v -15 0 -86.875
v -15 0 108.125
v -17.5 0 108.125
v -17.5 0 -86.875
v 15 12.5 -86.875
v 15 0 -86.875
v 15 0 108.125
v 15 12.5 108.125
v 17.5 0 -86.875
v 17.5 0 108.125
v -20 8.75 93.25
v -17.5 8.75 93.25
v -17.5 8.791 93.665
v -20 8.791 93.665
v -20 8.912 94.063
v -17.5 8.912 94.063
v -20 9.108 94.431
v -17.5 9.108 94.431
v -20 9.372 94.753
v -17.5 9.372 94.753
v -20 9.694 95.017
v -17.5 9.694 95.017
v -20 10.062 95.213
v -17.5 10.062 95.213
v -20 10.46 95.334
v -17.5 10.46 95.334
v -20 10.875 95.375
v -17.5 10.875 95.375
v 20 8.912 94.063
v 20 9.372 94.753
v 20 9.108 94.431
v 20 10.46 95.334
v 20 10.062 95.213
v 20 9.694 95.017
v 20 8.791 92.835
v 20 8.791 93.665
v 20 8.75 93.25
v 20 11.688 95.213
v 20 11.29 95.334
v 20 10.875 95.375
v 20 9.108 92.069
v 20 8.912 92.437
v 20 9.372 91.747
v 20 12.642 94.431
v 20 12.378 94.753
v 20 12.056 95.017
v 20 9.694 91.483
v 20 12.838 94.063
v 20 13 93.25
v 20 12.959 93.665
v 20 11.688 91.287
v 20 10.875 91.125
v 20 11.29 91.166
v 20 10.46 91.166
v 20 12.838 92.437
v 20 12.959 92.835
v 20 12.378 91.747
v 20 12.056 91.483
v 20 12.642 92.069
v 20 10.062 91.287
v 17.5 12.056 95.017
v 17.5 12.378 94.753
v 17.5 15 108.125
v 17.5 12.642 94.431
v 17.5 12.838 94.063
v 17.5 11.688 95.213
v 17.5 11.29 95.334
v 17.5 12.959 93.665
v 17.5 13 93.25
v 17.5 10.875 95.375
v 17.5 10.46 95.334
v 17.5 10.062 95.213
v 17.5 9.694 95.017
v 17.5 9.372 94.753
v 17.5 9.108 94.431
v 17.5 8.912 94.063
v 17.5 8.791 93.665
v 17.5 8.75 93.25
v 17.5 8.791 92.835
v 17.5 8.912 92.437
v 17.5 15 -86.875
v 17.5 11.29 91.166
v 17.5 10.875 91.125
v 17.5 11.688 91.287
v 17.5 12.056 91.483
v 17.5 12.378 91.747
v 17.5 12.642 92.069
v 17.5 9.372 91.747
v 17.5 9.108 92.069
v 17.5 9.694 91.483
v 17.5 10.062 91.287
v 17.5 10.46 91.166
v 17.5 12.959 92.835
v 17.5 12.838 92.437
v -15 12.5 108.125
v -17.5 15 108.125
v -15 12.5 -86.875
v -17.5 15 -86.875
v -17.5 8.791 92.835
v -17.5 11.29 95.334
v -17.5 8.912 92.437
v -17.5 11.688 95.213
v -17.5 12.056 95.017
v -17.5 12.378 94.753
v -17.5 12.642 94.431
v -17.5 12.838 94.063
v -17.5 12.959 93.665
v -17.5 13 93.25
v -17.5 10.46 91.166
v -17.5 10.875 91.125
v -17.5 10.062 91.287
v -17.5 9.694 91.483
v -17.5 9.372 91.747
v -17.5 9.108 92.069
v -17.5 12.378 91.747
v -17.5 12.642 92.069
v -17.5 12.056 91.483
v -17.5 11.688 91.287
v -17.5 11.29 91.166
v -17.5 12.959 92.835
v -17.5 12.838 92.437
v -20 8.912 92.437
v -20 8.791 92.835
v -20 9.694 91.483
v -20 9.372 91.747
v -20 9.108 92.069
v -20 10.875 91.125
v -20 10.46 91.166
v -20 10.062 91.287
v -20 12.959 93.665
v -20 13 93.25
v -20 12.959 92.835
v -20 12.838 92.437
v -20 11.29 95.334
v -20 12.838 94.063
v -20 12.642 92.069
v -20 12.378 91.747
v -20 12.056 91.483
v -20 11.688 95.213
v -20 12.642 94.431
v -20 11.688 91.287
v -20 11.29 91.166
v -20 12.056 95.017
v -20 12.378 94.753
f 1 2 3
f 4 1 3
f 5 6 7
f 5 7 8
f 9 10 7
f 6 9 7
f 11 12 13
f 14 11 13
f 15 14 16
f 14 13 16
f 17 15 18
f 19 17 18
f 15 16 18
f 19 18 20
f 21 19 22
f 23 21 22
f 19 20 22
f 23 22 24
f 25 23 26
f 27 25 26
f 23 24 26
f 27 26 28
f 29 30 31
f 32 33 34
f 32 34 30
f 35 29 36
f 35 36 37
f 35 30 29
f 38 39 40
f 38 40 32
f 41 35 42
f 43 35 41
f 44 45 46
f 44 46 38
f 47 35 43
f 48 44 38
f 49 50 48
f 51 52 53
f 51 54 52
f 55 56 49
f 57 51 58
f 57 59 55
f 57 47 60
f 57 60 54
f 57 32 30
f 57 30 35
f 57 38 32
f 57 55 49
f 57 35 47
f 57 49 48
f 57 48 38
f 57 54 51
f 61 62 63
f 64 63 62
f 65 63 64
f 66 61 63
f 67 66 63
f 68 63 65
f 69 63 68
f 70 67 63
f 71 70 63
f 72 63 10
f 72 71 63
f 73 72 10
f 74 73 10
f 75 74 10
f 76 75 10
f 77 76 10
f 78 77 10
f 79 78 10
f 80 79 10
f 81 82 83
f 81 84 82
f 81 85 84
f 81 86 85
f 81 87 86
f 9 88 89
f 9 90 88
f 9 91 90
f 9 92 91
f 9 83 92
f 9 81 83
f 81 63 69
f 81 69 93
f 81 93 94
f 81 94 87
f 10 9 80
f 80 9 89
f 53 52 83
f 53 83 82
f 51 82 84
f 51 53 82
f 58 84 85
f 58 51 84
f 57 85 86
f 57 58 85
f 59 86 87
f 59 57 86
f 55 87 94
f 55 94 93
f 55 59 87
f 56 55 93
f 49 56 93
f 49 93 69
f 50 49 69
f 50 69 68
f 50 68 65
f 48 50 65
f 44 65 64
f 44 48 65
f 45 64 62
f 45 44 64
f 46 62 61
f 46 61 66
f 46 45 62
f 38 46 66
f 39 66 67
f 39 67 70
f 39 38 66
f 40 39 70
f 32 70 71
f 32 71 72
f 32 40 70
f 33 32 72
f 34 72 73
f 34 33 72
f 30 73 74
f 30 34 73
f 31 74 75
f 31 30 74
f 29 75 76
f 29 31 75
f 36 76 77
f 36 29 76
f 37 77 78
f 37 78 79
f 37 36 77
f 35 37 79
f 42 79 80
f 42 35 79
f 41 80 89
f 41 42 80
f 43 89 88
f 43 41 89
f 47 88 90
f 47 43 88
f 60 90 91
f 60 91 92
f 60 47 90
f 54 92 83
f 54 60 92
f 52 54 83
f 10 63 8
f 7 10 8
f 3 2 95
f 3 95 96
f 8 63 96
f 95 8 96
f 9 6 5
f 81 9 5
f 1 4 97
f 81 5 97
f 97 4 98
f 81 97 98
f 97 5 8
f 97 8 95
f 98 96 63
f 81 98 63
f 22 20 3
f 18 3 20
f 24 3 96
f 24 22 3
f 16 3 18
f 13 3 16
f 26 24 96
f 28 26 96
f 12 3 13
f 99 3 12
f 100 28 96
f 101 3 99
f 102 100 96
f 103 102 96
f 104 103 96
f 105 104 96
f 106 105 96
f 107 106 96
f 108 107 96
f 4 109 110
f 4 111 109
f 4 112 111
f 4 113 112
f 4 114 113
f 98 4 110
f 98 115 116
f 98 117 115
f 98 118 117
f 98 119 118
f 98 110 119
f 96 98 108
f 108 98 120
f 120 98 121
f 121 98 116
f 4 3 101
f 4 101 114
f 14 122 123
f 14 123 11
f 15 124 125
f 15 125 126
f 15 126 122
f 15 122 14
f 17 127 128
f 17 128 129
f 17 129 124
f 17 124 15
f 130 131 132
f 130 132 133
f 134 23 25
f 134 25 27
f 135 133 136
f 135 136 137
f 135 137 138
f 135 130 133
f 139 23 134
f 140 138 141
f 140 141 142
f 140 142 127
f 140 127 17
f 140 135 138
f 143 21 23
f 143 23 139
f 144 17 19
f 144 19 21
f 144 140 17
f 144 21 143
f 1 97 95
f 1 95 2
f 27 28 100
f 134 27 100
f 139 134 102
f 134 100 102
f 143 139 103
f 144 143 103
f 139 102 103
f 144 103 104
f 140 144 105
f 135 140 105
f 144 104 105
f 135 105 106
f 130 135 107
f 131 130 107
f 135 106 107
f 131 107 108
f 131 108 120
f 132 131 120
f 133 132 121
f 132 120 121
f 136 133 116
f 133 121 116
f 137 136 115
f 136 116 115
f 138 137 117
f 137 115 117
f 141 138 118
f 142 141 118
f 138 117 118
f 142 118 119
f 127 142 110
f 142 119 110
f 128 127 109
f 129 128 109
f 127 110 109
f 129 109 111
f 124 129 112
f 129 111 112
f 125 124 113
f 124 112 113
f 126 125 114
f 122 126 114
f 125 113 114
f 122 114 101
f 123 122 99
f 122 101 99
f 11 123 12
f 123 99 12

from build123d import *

# Parameters (mm, degrees)
SKETCH1_W           = 35
SKETCH1_H           = 195
BOSS_EXTRUDE1_DEPTH = 15
BOSS_EXTRUDE2_DEPTH = 2.5
BOSS_EXTRUDE3_START = 2.5
SKETCH3_R           = 2.125
BOSS_EXTRUDE3_DEPTH = 2.5
SKETCH4_W           = 30
SKETCH4_H           = 25
CUT_EXTRUDE1_DEPTH  = 260.5
SKETCH5_W           = 10.625
SKETCH5_H           = 15
CUT_EXTRUDE2_DEPTH  = 65
BOSS_EXTRUDE4_DEPTH = 10.625


with BuildPart() as part:
    # Sketch1 → Boss-Extrude1 (new body)
    with BuildSketch(Plane(origin=(0, 0, 0), x_dir=(1, 0, 0), z_dir=(0, 1, 0))):
        Rectangle(SKETCH1_W, SKETCH1_H)
    extrude(amount=BOSS_EXTRUDE1_DEPTH)

    # Sketch2 → Boss-Extrude2 (add)
    with BuildSketch(Plane.ZY.offset(17.5)):
        with BuildLine():
            ThreePointArc((95.375, 10.875), (94.75260191, 12.37760191), (93.25, 13))
            ThreePointArc((93.25, 13), (91.125, 10.875), (93.25, 8.75))
            ThreePointArc((93.25, 8.75), (94.75260191, 9.37239809), (95.375, 10.875))
        make_face()
    extrude(amount=BOSS_EXTRUDE2_DEPTH)

    # Sketch3 → Boss-Extrude3 (add)
    with BuildSketch(Plane(origin=(17.5, 0, 0), x_dir=(0, 0, -1), z_dir=(1, 0, 0)).offset(BOSS_EXTRUDE3_START)):
        with Locations((-93.25, 10.875)):
            Circle(SKETCH3_R)
    extrude(amount=-BOSS_EXTRUDE3_DEPTH)

    # Sketch4 → Cut-Extrude1 (cut)
    with BuildSketch(Plane.XY.offset(97.5)):
        Rectangle(SKETCH4_W, SKETCH4_H)
    extrude(amount=-CUT_EXTRUDE1_DEPTH, mode=Mode.SUBTRACT)

    # Sketch5 → Cut-Extrude2 (cut)
    with BuildSketch(Plane.ZY.offset(17.5)):
        with Locations((-92.1875, 7.5)):
            Rectangle(SKETCH5_W, SKETCH5_H)
    extrude(amount=-CUT_EXTRUDE2_DEPTH, mode=Mode.SUBTRACT)

    # Sketch6 → Boss-Extrude4 (add)
    with BuildSketch(Plane.XY.offset(97.5)):
        Polygon((-17.5, 15), (17.5, 15), (17.5, 0), (15, 0), (15, 12.5), (-15, 12.5), (-15, 0), (-17.5, 0), align=None)
    extrude(amount=BOSS_EXTRUDE4_DEPTH)


solid = part.part
